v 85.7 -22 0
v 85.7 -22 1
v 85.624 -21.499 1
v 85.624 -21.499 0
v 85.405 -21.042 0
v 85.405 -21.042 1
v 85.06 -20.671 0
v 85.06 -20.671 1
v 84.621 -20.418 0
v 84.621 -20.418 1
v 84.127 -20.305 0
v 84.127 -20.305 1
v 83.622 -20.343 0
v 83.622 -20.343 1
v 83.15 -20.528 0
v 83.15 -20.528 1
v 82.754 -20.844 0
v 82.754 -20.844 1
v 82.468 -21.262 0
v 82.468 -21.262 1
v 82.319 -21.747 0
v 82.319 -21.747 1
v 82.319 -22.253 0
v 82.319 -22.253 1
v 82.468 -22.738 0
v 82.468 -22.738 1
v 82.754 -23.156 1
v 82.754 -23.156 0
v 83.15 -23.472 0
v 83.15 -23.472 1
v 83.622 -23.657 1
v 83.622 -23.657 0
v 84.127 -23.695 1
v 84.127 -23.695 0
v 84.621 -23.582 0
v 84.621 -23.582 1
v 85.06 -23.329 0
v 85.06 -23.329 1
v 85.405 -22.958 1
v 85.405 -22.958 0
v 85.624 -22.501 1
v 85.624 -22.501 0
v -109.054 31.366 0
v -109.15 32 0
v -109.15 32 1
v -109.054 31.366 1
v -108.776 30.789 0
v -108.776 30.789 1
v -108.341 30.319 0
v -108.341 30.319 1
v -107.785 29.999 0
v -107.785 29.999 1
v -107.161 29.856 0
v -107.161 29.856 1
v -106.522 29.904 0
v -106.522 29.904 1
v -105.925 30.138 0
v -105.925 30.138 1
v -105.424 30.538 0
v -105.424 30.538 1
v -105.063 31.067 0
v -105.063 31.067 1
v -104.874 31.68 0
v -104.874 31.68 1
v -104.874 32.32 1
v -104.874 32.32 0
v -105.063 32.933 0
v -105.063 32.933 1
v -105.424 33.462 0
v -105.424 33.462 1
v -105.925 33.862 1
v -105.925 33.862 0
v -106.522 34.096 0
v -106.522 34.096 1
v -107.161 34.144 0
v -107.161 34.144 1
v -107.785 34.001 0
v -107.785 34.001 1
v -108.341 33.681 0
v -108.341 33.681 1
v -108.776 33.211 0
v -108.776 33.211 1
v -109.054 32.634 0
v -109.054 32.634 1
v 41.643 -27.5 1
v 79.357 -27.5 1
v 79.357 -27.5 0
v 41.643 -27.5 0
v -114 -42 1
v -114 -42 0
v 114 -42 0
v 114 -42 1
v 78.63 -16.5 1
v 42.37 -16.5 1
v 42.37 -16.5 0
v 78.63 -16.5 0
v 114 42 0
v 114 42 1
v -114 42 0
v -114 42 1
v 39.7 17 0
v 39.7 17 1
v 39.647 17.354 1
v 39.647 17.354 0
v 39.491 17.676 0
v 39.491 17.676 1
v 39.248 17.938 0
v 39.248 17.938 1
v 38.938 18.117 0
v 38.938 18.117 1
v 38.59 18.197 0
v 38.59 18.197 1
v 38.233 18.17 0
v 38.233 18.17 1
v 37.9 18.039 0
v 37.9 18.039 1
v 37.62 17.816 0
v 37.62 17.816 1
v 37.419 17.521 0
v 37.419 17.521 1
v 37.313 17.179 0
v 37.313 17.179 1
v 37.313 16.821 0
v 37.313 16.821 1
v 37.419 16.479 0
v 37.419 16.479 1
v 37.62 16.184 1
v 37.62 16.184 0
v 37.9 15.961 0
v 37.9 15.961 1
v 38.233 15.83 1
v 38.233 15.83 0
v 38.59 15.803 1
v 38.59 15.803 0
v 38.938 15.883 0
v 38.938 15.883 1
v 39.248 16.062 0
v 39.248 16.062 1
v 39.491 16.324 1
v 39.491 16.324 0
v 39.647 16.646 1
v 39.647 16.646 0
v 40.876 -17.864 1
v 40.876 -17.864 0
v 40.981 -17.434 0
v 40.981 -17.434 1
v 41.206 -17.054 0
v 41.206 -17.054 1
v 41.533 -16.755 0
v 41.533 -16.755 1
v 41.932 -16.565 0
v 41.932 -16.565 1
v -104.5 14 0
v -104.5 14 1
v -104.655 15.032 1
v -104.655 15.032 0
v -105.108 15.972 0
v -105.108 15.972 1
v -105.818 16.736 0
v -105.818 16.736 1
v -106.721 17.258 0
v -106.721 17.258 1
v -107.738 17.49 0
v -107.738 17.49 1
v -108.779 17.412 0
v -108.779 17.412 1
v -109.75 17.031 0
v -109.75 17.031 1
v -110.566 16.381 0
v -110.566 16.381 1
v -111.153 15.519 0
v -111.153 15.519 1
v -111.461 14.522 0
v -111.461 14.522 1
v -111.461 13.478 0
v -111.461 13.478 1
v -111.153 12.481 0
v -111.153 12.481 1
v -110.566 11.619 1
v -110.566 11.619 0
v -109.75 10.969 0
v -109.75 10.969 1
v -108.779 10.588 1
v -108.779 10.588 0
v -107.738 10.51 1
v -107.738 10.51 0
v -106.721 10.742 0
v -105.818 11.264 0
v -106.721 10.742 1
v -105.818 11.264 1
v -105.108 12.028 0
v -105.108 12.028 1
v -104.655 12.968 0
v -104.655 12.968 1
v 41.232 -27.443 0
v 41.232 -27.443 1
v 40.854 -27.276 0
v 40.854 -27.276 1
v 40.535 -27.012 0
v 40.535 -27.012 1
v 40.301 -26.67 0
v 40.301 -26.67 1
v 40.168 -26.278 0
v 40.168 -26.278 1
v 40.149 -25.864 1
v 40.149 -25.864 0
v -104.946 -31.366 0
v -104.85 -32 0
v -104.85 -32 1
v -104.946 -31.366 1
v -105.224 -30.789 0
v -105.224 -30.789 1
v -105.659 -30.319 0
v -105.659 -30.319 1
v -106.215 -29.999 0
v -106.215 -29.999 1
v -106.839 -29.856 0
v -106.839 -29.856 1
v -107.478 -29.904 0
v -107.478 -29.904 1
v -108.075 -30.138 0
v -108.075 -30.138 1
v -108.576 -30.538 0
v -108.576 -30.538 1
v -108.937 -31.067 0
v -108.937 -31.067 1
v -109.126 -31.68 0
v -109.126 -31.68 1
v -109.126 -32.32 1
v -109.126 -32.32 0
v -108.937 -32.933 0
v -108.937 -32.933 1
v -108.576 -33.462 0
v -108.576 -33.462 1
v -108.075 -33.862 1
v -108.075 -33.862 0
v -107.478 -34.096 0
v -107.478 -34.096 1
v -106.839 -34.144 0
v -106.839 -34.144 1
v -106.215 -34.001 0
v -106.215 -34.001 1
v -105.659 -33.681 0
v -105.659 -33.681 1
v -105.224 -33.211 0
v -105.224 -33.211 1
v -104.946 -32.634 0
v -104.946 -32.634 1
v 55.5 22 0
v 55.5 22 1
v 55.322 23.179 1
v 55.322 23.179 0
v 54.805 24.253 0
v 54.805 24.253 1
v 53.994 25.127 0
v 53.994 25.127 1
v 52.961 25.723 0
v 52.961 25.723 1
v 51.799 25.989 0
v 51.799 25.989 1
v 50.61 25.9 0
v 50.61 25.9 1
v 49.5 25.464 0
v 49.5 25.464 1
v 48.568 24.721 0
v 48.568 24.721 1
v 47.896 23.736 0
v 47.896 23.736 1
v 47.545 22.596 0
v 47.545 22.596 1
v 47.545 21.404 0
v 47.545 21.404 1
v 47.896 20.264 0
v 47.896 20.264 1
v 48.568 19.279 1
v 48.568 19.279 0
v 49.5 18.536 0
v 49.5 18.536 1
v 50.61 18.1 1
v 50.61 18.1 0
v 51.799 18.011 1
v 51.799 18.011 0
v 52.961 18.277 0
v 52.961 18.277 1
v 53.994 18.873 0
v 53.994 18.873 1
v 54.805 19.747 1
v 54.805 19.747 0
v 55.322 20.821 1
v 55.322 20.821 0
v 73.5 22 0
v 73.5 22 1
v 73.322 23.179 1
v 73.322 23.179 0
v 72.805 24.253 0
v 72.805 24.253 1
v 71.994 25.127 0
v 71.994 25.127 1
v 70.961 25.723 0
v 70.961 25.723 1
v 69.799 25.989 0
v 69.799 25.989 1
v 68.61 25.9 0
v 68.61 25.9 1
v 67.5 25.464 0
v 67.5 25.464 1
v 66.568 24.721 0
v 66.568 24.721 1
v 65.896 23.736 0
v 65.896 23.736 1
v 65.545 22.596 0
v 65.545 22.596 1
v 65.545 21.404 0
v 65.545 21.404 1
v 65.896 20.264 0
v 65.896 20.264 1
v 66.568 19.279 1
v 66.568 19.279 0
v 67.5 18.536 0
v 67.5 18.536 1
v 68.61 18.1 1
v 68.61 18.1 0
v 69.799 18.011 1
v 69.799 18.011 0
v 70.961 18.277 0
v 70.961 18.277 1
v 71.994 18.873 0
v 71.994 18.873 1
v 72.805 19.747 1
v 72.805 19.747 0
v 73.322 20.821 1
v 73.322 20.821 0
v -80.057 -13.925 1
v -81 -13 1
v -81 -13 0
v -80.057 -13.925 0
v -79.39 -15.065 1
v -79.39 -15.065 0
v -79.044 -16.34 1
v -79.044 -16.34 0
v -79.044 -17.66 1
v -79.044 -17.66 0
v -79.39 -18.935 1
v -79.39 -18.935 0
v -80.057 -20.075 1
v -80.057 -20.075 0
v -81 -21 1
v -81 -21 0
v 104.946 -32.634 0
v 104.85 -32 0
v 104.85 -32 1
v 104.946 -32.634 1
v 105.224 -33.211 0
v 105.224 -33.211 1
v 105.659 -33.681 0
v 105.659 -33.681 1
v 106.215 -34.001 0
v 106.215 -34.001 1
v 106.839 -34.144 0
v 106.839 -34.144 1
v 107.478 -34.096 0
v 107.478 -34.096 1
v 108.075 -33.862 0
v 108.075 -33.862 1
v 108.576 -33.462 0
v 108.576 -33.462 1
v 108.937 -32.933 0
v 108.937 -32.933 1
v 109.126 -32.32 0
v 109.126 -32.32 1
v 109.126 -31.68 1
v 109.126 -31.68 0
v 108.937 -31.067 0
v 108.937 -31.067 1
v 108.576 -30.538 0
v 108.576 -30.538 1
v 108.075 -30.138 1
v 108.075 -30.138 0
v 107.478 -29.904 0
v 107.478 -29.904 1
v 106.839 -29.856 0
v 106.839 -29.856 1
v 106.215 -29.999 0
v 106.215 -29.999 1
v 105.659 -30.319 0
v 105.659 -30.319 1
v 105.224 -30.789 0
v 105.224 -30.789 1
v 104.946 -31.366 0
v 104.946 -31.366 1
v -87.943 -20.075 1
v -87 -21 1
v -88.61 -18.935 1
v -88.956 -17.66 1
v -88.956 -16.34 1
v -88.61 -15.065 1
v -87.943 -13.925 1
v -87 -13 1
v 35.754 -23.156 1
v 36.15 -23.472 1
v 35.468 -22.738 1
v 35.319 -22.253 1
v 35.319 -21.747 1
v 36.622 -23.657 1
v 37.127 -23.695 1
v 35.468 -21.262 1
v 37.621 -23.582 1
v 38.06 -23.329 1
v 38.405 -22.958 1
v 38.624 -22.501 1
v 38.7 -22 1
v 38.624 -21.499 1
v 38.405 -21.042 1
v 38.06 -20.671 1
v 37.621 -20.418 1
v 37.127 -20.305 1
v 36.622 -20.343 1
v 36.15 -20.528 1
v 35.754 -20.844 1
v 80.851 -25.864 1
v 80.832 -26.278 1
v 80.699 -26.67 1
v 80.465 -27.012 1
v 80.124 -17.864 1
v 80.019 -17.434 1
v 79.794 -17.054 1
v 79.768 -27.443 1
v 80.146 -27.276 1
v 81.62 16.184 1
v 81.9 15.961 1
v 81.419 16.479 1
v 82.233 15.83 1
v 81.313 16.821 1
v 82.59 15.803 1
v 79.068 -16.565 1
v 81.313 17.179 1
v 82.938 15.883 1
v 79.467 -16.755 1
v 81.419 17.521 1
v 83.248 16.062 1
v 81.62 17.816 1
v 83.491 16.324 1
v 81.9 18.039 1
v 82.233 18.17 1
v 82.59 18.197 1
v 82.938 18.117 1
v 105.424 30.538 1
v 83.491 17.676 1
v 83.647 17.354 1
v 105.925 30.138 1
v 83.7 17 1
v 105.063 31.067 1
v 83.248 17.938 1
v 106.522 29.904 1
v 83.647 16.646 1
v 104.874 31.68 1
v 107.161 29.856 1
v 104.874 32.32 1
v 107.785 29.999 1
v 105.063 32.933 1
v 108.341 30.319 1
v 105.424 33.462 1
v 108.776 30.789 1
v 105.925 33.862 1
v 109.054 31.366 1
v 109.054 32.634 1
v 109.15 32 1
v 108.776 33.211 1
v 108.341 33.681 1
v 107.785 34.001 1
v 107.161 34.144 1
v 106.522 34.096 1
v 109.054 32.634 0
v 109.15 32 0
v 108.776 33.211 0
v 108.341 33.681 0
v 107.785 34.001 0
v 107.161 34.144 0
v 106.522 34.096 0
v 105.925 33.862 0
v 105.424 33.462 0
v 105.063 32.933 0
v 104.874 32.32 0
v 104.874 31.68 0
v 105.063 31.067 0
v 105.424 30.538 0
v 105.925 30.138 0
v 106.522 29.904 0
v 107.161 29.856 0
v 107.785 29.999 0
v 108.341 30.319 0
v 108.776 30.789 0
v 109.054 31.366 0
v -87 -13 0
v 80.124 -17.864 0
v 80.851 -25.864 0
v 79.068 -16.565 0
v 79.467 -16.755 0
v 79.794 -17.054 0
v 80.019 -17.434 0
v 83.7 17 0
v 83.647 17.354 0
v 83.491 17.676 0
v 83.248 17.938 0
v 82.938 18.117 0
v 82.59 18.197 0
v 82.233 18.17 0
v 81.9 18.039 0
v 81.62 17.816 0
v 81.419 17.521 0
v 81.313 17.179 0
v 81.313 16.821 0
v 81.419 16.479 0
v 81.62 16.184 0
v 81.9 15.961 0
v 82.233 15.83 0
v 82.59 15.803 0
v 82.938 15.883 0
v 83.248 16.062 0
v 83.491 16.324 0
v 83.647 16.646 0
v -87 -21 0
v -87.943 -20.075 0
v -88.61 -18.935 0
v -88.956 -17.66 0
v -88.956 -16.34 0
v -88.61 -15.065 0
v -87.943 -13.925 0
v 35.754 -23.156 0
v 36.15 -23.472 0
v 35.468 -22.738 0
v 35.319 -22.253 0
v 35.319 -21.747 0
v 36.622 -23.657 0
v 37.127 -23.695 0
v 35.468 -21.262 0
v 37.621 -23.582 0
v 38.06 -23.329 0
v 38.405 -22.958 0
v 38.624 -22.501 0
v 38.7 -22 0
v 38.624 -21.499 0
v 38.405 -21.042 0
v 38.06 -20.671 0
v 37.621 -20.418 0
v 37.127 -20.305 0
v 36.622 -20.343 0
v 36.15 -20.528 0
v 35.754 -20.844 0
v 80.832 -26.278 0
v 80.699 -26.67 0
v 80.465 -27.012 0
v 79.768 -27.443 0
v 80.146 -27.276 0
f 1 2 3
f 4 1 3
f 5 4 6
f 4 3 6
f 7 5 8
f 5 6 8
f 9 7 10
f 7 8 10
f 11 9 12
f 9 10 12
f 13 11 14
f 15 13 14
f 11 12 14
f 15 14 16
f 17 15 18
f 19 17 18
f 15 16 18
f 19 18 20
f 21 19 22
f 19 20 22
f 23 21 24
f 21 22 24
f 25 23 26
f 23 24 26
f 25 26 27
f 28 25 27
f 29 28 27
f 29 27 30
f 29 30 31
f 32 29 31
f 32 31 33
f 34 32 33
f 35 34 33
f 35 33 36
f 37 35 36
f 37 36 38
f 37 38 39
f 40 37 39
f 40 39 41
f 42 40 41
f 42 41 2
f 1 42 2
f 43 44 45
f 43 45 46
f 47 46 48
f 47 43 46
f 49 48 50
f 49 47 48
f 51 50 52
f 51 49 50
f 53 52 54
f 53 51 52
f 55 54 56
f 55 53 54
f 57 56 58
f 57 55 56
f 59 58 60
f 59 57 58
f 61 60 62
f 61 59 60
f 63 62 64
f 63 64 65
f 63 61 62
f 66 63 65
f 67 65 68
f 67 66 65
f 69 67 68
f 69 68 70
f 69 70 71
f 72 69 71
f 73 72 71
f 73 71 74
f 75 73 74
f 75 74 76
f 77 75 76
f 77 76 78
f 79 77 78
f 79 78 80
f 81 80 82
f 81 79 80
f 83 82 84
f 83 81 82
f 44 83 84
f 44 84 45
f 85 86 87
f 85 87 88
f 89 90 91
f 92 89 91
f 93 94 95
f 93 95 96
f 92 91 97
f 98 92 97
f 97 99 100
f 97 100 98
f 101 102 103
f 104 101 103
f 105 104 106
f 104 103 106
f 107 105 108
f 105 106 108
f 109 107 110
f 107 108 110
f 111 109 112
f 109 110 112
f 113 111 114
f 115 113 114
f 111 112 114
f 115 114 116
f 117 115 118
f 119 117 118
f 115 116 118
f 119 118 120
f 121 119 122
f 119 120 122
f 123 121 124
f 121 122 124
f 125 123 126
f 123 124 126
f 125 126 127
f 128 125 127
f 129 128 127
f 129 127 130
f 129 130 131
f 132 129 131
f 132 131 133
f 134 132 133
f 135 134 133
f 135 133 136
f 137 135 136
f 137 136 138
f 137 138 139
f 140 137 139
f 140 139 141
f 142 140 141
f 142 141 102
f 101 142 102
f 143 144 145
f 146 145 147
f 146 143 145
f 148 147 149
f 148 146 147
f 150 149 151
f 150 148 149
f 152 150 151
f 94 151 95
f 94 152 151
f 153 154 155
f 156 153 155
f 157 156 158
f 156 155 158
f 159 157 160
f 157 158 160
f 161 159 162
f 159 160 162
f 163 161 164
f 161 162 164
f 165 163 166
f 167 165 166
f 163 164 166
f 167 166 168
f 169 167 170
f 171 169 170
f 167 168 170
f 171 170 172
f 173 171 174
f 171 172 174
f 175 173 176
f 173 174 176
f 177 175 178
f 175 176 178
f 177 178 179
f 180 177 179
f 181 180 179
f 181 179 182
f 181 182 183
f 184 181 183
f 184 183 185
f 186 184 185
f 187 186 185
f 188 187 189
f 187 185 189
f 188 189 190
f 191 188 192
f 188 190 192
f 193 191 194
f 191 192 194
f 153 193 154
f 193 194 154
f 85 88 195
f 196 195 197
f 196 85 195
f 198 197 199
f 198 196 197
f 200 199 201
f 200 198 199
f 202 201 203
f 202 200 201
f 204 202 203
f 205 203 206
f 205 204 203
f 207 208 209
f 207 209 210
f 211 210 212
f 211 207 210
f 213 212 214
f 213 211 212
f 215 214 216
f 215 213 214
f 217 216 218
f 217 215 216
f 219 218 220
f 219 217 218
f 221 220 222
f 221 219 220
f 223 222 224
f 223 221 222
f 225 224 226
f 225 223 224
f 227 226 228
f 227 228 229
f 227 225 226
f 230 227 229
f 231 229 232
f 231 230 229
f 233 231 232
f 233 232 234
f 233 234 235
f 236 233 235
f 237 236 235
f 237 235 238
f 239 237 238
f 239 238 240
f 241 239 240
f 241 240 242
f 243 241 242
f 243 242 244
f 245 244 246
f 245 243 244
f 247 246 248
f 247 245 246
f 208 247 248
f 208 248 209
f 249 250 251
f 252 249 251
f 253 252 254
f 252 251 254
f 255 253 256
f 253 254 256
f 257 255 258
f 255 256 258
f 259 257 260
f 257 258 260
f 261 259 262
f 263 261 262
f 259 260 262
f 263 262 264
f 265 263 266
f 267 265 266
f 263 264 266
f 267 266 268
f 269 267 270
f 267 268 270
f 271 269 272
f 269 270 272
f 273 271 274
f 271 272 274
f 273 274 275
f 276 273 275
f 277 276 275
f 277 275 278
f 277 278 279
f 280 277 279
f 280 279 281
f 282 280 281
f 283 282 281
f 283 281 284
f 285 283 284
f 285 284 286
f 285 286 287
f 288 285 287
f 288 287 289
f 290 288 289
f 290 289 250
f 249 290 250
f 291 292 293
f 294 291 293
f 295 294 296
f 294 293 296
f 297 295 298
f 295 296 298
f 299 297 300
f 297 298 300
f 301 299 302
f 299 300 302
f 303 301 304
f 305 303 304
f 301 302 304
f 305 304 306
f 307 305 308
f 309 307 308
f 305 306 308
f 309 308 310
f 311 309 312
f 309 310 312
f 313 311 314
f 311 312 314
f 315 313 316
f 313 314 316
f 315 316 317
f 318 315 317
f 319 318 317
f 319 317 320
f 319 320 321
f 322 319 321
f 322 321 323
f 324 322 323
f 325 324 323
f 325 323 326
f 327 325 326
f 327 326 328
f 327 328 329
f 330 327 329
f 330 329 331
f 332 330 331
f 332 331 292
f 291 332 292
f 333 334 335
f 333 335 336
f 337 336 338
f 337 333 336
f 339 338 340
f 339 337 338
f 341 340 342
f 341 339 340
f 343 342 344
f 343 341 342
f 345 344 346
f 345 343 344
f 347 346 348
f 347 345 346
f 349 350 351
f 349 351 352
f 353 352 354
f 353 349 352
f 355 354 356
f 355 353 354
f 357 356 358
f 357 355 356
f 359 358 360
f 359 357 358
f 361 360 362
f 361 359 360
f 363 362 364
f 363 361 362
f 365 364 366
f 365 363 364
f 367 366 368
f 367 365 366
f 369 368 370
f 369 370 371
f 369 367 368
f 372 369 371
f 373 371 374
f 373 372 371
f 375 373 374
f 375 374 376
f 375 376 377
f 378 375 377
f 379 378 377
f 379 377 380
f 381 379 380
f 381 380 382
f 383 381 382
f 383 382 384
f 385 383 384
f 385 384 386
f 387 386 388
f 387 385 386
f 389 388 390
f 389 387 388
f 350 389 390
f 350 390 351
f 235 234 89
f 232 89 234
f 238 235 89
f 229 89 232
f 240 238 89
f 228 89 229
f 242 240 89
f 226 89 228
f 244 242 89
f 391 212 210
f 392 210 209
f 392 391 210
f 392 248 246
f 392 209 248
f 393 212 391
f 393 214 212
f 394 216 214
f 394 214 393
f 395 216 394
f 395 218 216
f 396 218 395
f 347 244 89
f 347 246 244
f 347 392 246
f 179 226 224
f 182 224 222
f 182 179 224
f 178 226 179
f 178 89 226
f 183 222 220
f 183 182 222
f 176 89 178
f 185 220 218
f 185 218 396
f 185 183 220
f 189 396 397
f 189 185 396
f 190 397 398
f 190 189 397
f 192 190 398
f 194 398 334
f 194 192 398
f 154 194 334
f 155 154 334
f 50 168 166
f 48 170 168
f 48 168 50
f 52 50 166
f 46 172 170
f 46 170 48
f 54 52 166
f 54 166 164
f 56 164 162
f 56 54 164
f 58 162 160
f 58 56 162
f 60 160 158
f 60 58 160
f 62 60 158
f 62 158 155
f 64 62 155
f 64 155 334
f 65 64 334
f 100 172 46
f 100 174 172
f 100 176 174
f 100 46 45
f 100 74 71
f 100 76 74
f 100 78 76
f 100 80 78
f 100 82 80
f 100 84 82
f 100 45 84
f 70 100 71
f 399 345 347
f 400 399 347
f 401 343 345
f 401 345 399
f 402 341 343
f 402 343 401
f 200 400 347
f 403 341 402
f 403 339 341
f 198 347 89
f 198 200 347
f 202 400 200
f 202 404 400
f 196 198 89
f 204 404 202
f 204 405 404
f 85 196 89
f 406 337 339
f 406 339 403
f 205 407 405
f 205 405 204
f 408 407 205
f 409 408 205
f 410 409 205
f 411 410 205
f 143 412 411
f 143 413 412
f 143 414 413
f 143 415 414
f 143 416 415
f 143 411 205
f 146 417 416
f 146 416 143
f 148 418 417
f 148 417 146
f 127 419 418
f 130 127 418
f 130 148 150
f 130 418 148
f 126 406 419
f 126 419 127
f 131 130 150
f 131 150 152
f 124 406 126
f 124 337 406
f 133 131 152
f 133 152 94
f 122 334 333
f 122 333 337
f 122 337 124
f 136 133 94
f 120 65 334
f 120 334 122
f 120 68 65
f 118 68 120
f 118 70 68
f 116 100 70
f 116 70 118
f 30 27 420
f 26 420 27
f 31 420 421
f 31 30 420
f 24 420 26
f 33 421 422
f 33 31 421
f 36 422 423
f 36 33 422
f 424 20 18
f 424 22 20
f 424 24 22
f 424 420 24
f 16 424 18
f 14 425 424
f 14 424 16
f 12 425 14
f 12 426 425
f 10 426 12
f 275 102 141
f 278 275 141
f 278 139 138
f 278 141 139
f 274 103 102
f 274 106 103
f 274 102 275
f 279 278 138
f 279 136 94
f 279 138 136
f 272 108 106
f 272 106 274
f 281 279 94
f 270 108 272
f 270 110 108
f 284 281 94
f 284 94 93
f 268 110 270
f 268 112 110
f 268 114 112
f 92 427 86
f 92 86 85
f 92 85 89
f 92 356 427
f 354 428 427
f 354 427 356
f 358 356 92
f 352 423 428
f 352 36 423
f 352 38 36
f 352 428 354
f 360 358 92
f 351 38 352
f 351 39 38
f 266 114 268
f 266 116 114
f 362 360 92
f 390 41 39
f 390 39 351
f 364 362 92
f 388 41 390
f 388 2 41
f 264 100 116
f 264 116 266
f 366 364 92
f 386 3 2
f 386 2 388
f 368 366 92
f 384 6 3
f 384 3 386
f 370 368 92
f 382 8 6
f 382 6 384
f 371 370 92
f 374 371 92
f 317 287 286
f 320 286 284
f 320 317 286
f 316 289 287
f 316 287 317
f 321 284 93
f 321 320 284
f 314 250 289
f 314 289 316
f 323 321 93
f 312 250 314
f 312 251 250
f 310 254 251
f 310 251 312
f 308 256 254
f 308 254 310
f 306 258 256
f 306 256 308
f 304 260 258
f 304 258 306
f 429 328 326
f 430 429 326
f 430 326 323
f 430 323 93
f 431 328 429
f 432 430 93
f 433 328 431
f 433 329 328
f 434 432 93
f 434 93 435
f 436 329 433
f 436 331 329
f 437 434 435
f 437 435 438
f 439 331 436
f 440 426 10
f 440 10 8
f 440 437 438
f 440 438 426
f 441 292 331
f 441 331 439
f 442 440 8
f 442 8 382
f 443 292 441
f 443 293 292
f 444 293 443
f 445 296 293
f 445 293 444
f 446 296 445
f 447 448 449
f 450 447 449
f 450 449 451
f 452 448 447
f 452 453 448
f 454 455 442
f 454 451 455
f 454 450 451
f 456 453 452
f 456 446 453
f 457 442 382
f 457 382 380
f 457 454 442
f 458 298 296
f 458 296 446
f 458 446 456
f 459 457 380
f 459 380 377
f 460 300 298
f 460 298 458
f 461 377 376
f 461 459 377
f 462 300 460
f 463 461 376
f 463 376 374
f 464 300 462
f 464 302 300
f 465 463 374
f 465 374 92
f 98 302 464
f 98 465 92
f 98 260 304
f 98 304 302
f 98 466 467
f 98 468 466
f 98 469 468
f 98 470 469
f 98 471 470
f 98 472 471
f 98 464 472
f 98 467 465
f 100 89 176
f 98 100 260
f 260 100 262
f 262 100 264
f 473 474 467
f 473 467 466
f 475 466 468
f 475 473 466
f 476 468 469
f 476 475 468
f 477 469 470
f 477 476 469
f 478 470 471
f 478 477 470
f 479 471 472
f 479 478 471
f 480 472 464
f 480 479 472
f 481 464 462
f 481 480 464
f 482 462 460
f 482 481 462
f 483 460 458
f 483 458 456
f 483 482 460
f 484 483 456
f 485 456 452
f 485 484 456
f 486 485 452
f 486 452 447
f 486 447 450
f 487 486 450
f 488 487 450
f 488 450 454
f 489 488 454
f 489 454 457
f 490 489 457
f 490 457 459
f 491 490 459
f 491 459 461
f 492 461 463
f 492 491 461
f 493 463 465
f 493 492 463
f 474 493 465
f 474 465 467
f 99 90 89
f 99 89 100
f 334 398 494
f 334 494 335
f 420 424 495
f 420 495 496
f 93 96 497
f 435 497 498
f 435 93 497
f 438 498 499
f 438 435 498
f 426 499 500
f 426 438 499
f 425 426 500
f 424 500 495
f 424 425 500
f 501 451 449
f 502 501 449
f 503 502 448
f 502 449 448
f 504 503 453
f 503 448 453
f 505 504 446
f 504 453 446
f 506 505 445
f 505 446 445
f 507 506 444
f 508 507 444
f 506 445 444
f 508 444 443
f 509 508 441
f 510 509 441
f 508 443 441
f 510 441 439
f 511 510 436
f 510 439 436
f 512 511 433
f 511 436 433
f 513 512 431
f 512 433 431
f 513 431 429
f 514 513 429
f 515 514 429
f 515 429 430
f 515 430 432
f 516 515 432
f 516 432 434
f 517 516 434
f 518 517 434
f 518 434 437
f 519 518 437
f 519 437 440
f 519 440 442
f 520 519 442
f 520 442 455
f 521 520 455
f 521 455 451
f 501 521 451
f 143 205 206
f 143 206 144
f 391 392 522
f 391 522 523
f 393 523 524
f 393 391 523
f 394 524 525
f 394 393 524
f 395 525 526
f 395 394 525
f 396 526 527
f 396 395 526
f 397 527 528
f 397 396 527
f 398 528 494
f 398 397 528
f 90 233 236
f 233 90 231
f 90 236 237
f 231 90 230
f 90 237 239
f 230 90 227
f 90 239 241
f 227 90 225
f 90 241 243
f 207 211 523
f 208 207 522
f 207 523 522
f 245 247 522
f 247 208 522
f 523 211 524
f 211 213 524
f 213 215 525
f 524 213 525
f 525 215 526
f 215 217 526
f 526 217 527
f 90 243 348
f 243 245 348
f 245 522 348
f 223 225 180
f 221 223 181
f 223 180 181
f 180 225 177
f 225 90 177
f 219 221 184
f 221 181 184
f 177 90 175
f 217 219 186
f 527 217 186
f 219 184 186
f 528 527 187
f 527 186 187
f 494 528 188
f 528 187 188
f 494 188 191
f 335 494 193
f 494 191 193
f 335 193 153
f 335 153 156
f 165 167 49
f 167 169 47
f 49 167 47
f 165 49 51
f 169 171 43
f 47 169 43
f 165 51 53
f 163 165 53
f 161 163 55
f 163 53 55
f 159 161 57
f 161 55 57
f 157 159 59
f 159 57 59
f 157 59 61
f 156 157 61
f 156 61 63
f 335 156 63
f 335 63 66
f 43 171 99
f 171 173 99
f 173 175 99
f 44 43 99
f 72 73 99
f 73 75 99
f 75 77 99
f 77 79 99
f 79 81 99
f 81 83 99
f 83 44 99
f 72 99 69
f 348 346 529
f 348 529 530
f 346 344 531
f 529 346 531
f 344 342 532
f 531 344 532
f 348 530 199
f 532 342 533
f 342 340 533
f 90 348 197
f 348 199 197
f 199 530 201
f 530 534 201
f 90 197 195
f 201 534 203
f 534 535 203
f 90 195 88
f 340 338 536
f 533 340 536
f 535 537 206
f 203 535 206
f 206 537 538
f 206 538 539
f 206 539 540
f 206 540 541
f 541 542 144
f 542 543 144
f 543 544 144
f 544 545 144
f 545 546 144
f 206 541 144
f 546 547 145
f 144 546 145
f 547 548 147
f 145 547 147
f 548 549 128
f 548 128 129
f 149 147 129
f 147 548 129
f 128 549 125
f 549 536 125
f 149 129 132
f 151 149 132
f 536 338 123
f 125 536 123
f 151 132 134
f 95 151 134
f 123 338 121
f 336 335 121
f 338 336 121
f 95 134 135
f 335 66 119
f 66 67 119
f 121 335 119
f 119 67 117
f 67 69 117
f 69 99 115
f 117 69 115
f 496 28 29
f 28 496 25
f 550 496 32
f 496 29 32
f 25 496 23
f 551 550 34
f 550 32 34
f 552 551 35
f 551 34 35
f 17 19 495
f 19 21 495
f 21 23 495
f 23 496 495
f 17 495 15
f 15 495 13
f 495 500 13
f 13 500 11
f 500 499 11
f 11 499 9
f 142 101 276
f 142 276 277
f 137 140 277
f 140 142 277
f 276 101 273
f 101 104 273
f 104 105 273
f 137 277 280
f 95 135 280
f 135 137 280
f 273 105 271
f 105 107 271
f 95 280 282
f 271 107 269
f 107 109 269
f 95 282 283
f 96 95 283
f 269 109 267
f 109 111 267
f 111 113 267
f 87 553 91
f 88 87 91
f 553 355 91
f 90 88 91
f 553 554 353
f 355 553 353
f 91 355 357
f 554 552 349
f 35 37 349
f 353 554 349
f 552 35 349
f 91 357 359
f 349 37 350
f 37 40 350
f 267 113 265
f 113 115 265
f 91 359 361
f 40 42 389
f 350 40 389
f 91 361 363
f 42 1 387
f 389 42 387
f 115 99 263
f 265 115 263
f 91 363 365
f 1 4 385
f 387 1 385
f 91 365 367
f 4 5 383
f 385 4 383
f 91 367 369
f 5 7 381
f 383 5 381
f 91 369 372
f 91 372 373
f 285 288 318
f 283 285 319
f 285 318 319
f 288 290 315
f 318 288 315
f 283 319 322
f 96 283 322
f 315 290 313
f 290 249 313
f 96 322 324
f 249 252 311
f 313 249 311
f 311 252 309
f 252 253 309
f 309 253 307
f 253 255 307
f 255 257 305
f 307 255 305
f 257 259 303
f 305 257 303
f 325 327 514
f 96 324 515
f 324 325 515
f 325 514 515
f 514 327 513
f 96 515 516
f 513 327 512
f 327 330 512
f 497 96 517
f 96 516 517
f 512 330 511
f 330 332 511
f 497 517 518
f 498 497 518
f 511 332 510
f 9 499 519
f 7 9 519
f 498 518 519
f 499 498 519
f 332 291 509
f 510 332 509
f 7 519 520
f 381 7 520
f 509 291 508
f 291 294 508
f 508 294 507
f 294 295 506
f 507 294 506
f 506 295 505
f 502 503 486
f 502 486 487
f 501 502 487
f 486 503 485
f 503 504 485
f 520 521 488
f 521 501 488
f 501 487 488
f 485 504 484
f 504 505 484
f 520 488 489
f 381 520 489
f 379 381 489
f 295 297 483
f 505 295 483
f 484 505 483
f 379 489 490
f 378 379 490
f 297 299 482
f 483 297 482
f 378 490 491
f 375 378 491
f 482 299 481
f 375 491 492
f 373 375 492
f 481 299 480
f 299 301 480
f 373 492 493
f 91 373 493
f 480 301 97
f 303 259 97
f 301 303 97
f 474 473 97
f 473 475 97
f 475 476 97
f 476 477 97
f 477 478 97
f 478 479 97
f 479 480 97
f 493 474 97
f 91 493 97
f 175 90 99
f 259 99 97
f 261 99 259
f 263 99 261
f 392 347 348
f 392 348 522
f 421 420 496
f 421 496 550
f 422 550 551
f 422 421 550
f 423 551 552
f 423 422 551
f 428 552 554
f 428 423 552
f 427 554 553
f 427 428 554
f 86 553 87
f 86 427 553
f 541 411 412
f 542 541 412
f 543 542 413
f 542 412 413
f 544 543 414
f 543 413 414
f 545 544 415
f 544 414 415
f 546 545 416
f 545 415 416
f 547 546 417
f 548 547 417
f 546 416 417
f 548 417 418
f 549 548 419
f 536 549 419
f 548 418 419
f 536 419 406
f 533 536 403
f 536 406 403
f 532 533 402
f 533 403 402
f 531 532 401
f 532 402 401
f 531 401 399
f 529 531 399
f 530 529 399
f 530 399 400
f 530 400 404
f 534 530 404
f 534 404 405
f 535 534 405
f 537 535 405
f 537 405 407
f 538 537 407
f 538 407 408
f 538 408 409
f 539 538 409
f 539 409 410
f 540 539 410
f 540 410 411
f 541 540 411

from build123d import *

# Parameters (mm, degrees)
SKETCH_1_W          = 228
SKETCH_1_H          = 84
SKETCH_1_R          = 2.15
EXTRUDE_1_DEPTH     = 1
SKETCH_3_R          = 1.7
SKETCH_3_R_2        = 1.2
SKETCH_3_R_3        = 4
CUT_EXTRUDE_1_DEPTH = 10
SKETCH_4_R          = 3.5
CUT_EXTRUDE_2_DEPTH = 1


with BuildPart() as part:
    # Эскиз1 → Вытянуть1 (new body)
    with BuildSketch(Plane.XY):
        Rectangle(SKETCH_1_W, SKETCH_1_H)
        with Locations((107, 32)):
            Circle(SKETCH_1_R, mode=Mode.SUBTRACT)
        with Locations(Location((-107, 32, 0), (0, 0, 180))):
            Circle(SKETCH_1_R, mode=Mode.SUBTRACT)
        with Locations((-107, -32)):
            Circle(SKETCH_1_R, mode=Mode.SUBTRACT)
        with Locations(Location((107, -32, 0), (0, 0, 180))):
            Circle(SKETCH_1_R, mode=Mode.SUBTRACT)
    extrude(amount=EXTRUDE_1_DEPTH)

    # Эскиз3 → Вырез-Вытянуть1 (cut)
    with BuildSketch(Plane.XY.offset(1)):
        with Locations((37, -22)):
            Circle(SKETCH_3_R)
        with Locations((84, -22)):
            Circle(SKETCH_3_R)
        with Locations((38.5, 17)):
            Circle(SKETCH_3_R_2)
        with Locations((82.5, 17)):
            Circle(SKETCH_3_R_2)
        with Locations((51.5, 22)):
            Circle(SKETCH_3_R_3)
        with Locations((69.5, 22)):
            Circle(SKETCH_3_R_3)
        with BuildLine():
            Line((40.14870942, -25.864196381), (40.875982147, -17.864196381))
            ThreePointArc((40.875982147, -17.864196381), (41.358314525, -16.892366164), (42.369821957, -16.5))
            Line((42.369821957, -16.5), (78.630178043, -16.5))
            ThreePointArc((78.630178043, -16.5), (79.641685475, -16.892366164), (80.124017853, -17.864196381))
            Line((80.124017853, -17.864196381), (80.85129058, -25.864196381))
            ThreePointArc((80.85129058, -25.864196381), (80.465084606, -27.011507432), (79.35745077, -27.5))
            Line((79.35745077, -27.5), (41.64254923, -27.5))
            ThreePointArc((41.64254923, -27.5), (40.534915394, -27.011507432), (40.14870942, -25.864196381))
        make_face()
    extrude(amount=-CUT_EXTRUDE_1_DEPTH, mode=Mode.SUBTRACT)

    # Эскиз4 → Вырез-Вытянуть2 (cut)
    with BuildSketch(Plane.XY.offset(1)):
        with Locations((-108, 14)):
            Circle(SKETCH_4_R)
        with BuildLine():
            Line((-87, -13), (-81, -13))
            ThreePointArc((-81, -13), (-79, -17), (-81, -21))
            Line((-81, -21), (-87, -21))
            ThreePointArc((-87, -21), (-89, -17), (-87, -13))
        make_face()
    extrude(amount=-CUT_EXTRUDE_2_DEPTH, mode=Mode.SUBTRACT)


solid = part.part
